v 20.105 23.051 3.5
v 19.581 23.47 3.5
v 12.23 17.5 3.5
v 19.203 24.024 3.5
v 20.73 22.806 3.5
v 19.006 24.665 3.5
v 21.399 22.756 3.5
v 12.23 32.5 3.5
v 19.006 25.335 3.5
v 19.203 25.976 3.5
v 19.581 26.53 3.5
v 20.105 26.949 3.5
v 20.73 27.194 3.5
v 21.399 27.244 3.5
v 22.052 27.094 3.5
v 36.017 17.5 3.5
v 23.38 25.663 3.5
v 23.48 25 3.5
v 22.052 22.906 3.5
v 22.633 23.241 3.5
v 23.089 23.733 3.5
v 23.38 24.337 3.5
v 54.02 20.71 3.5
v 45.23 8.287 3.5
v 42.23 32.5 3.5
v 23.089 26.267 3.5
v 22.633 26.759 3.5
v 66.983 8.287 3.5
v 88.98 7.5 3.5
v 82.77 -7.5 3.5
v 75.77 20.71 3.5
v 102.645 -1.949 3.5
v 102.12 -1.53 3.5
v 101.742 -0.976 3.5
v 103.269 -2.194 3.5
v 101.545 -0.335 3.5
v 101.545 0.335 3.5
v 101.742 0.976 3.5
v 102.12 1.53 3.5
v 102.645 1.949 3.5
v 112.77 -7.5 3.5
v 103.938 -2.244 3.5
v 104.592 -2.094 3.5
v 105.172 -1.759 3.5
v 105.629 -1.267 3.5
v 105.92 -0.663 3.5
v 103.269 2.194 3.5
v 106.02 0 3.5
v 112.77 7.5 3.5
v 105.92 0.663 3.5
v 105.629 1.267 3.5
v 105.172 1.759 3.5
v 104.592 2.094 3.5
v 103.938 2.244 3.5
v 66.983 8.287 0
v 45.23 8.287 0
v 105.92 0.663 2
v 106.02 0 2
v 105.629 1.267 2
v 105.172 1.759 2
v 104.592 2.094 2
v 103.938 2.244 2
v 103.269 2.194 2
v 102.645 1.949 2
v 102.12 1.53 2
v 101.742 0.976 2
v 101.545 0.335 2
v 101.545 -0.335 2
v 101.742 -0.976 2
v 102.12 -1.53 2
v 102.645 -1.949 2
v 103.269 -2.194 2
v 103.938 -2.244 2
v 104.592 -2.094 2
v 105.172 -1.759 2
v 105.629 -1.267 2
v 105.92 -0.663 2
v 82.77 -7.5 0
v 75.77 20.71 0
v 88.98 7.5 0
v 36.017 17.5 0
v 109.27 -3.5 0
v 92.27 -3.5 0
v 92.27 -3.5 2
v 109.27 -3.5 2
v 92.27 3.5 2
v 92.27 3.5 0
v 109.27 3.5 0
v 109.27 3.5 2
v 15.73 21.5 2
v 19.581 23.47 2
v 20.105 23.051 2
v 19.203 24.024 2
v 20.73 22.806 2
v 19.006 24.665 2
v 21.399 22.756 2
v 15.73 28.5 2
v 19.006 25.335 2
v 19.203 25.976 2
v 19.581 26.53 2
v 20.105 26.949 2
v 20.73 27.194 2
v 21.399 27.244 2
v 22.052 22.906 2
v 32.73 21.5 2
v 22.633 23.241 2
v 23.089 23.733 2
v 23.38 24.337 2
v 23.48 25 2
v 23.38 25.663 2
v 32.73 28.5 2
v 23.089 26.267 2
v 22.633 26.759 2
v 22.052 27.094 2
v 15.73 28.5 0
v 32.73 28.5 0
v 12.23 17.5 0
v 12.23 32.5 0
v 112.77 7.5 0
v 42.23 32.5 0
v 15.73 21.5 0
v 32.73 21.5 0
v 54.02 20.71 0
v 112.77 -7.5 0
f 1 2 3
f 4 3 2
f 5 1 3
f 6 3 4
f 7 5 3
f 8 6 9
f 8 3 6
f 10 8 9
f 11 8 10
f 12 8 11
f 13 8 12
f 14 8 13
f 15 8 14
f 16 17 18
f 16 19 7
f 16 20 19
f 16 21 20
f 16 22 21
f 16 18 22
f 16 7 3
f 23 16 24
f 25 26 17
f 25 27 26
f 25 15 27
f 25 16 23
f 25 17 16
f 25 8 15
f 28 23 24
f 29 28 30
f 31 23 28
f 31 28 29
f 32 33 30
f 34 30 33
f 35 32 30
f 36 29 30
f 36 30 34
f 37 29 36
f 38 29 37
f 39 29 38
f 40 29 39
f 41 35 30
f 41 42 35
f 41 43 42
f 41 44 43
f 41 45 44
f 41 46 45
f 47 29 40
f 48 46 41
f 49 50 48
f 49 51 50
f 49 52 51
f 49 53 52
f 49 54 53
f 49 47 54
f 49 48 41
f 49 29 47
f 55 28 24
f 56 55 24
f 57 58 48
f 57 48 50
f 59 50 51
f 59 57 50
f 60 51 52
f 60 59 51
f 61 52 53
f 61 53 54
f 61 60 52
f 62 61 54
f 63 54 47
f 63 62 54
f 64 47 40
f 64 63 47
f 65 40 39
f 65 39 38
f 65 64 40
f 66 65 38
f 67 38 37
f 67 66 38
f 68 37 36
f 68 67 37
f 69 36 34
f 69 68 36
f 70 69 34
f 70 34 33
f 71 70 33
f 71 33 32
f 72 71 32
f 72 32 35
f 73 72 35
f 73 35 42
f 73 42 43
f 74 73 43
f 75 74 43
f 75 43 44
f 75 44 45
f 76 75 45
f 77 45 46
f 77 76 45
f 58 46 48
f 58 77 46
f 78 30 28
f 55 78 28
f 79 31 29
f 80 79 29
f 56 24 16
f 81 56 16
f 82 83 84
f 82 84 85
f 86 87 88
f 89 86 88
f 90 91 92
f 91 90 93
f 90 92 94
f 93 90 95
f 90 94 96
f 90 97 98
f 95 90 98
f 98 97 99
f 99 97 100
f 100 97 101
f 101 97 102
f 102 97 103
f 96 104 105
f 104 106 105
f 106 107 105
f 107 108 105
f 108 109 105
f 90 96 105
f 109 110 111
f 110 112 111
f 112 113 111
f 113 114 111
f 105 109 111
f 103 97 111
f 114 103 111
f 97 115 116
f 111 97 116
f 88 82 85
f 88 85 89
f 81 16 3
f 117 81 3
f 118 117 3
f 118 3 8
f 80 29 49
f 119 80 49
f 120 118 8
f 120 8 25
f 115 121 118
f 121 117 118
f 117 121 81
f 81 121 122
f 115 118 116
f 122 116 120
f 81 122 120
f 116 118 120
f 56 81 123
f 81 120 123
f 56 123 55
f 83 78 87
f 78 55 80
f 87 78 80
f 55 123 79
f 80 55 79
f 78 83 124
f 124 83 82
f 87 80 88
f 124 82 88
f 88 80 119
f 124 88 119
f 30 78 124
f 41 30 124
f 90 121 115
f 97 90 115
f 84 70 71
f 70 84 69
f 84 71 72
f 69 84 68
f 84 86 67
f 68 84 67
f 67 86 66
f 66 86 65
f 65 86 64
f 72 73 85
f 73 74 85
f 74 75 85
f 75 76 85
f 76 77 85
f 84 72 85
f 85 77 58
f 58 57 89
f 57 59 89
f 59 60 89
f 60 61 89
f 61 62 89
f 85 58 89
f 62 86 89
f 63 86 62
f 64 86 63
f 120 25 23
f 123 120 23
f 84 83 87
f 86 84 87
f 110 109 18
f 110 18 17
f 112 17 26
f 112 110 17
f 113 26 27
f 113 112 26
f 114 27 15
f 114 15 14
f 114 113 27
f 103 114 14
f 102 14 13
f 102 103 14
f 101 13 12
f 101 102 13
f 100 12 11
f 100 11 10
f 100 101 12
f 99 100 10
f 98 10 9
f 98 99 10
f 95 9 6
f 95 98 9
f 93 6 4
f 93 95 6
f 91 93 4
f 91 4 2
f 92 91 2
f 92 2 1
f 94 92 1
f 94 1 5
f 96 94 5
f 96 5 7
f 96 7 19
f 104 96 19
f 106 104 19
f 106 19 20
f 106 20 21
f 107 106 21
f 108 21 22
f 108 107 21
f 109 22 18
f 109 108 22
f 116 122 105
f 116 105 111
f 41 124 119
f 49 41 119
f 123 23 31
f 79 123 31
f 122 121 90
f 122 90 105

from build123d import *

# Parameters (mm, degrees)
SKETCH_1_W          = 100.539230484
SKETCH_1_H          = 40
SKETCH_1_W_2        = 17
SKETCH_1_H_2        = 7
EXTRUDE_1_DEPTH     = 2
SKETCH_2_W          = 100.539230484
SKETCH_2_H          = 40
SKETCH_2_R          = 2.25
EXTRUDE_2_DEPTH     = 1.5
SKETCH_3_W          = 184.808915215
SKETCH_3_H          = 94.825170589
CUT_EXTRUDE_1_DEPTH = 31.5


with BuildPart() as part:
    # Sketch 1 → Extrude 1 (new body)
    with BuildSketch(Plane.XY):
        with Locations((62.5, 12.5)):
            Rectangle(SKETCH_1_W, SKETCH_1_H)
        with Locations((24.230384758, 25)):
            Rectangle(SKETCH_1_W_2, SKETCH_1_H_2, mode=Mode.SUBTRACT)
        with Locations((100.769615242, 0)):
            Rectangle(SKETCH_1_W_2, SKETCH_1_H_2, mode=Mode.SUBTRACT)
    extrude(amount=EXTRUDE_1_DEPTH)

    # Sketch 2 → Extrude 2 (add)
    with BuildSketch(Plane.XY.offset(2)):
        with Locations((62.5, 12.5)):
            Rectangle(SKETCH_2_W, SKETCH_2_H)
        with Locations((21.230384758, 25)):
            Circle(SKETCH_2_R, mode=Mode.SUBTRACT)
        with Locations((103.769615242, 0)):
            Circle(SKETCH_2_R, mode=Mode.SUBTRACT)
    extrude(amount=EXTRUDE_2_DEPTH)

    # Sketch 3 → Cut-Extrude 1 (cut)
    with BuildSketch(Plane.XY.offset(3.5)):
        with Locations((81.231416835, 7.831688581)):
            Rectangle(SKETCH_3_W, SKETCH_3_H)
        Polygon((12.230384758, 32.5), (42.230384758, 32.5), (54.020384758, 20.71), (75.769615242, 20.71), (88.979615242, 7.5), (112.769615242, 7.5), (112.769615242, -7.5), (82.769615242, -7.5), (66.982818678, 8.286796564), (45.230384758, 8.286796564), (36.017181322, 17.5), (12.230384758, 17.5), align=None, mode=Mode.SUBTRACT)
    extrude(amount=-CUT_EXTRUDE_1_DEPTH, mode=Mode.SUBTRACT)


solid = part.part
